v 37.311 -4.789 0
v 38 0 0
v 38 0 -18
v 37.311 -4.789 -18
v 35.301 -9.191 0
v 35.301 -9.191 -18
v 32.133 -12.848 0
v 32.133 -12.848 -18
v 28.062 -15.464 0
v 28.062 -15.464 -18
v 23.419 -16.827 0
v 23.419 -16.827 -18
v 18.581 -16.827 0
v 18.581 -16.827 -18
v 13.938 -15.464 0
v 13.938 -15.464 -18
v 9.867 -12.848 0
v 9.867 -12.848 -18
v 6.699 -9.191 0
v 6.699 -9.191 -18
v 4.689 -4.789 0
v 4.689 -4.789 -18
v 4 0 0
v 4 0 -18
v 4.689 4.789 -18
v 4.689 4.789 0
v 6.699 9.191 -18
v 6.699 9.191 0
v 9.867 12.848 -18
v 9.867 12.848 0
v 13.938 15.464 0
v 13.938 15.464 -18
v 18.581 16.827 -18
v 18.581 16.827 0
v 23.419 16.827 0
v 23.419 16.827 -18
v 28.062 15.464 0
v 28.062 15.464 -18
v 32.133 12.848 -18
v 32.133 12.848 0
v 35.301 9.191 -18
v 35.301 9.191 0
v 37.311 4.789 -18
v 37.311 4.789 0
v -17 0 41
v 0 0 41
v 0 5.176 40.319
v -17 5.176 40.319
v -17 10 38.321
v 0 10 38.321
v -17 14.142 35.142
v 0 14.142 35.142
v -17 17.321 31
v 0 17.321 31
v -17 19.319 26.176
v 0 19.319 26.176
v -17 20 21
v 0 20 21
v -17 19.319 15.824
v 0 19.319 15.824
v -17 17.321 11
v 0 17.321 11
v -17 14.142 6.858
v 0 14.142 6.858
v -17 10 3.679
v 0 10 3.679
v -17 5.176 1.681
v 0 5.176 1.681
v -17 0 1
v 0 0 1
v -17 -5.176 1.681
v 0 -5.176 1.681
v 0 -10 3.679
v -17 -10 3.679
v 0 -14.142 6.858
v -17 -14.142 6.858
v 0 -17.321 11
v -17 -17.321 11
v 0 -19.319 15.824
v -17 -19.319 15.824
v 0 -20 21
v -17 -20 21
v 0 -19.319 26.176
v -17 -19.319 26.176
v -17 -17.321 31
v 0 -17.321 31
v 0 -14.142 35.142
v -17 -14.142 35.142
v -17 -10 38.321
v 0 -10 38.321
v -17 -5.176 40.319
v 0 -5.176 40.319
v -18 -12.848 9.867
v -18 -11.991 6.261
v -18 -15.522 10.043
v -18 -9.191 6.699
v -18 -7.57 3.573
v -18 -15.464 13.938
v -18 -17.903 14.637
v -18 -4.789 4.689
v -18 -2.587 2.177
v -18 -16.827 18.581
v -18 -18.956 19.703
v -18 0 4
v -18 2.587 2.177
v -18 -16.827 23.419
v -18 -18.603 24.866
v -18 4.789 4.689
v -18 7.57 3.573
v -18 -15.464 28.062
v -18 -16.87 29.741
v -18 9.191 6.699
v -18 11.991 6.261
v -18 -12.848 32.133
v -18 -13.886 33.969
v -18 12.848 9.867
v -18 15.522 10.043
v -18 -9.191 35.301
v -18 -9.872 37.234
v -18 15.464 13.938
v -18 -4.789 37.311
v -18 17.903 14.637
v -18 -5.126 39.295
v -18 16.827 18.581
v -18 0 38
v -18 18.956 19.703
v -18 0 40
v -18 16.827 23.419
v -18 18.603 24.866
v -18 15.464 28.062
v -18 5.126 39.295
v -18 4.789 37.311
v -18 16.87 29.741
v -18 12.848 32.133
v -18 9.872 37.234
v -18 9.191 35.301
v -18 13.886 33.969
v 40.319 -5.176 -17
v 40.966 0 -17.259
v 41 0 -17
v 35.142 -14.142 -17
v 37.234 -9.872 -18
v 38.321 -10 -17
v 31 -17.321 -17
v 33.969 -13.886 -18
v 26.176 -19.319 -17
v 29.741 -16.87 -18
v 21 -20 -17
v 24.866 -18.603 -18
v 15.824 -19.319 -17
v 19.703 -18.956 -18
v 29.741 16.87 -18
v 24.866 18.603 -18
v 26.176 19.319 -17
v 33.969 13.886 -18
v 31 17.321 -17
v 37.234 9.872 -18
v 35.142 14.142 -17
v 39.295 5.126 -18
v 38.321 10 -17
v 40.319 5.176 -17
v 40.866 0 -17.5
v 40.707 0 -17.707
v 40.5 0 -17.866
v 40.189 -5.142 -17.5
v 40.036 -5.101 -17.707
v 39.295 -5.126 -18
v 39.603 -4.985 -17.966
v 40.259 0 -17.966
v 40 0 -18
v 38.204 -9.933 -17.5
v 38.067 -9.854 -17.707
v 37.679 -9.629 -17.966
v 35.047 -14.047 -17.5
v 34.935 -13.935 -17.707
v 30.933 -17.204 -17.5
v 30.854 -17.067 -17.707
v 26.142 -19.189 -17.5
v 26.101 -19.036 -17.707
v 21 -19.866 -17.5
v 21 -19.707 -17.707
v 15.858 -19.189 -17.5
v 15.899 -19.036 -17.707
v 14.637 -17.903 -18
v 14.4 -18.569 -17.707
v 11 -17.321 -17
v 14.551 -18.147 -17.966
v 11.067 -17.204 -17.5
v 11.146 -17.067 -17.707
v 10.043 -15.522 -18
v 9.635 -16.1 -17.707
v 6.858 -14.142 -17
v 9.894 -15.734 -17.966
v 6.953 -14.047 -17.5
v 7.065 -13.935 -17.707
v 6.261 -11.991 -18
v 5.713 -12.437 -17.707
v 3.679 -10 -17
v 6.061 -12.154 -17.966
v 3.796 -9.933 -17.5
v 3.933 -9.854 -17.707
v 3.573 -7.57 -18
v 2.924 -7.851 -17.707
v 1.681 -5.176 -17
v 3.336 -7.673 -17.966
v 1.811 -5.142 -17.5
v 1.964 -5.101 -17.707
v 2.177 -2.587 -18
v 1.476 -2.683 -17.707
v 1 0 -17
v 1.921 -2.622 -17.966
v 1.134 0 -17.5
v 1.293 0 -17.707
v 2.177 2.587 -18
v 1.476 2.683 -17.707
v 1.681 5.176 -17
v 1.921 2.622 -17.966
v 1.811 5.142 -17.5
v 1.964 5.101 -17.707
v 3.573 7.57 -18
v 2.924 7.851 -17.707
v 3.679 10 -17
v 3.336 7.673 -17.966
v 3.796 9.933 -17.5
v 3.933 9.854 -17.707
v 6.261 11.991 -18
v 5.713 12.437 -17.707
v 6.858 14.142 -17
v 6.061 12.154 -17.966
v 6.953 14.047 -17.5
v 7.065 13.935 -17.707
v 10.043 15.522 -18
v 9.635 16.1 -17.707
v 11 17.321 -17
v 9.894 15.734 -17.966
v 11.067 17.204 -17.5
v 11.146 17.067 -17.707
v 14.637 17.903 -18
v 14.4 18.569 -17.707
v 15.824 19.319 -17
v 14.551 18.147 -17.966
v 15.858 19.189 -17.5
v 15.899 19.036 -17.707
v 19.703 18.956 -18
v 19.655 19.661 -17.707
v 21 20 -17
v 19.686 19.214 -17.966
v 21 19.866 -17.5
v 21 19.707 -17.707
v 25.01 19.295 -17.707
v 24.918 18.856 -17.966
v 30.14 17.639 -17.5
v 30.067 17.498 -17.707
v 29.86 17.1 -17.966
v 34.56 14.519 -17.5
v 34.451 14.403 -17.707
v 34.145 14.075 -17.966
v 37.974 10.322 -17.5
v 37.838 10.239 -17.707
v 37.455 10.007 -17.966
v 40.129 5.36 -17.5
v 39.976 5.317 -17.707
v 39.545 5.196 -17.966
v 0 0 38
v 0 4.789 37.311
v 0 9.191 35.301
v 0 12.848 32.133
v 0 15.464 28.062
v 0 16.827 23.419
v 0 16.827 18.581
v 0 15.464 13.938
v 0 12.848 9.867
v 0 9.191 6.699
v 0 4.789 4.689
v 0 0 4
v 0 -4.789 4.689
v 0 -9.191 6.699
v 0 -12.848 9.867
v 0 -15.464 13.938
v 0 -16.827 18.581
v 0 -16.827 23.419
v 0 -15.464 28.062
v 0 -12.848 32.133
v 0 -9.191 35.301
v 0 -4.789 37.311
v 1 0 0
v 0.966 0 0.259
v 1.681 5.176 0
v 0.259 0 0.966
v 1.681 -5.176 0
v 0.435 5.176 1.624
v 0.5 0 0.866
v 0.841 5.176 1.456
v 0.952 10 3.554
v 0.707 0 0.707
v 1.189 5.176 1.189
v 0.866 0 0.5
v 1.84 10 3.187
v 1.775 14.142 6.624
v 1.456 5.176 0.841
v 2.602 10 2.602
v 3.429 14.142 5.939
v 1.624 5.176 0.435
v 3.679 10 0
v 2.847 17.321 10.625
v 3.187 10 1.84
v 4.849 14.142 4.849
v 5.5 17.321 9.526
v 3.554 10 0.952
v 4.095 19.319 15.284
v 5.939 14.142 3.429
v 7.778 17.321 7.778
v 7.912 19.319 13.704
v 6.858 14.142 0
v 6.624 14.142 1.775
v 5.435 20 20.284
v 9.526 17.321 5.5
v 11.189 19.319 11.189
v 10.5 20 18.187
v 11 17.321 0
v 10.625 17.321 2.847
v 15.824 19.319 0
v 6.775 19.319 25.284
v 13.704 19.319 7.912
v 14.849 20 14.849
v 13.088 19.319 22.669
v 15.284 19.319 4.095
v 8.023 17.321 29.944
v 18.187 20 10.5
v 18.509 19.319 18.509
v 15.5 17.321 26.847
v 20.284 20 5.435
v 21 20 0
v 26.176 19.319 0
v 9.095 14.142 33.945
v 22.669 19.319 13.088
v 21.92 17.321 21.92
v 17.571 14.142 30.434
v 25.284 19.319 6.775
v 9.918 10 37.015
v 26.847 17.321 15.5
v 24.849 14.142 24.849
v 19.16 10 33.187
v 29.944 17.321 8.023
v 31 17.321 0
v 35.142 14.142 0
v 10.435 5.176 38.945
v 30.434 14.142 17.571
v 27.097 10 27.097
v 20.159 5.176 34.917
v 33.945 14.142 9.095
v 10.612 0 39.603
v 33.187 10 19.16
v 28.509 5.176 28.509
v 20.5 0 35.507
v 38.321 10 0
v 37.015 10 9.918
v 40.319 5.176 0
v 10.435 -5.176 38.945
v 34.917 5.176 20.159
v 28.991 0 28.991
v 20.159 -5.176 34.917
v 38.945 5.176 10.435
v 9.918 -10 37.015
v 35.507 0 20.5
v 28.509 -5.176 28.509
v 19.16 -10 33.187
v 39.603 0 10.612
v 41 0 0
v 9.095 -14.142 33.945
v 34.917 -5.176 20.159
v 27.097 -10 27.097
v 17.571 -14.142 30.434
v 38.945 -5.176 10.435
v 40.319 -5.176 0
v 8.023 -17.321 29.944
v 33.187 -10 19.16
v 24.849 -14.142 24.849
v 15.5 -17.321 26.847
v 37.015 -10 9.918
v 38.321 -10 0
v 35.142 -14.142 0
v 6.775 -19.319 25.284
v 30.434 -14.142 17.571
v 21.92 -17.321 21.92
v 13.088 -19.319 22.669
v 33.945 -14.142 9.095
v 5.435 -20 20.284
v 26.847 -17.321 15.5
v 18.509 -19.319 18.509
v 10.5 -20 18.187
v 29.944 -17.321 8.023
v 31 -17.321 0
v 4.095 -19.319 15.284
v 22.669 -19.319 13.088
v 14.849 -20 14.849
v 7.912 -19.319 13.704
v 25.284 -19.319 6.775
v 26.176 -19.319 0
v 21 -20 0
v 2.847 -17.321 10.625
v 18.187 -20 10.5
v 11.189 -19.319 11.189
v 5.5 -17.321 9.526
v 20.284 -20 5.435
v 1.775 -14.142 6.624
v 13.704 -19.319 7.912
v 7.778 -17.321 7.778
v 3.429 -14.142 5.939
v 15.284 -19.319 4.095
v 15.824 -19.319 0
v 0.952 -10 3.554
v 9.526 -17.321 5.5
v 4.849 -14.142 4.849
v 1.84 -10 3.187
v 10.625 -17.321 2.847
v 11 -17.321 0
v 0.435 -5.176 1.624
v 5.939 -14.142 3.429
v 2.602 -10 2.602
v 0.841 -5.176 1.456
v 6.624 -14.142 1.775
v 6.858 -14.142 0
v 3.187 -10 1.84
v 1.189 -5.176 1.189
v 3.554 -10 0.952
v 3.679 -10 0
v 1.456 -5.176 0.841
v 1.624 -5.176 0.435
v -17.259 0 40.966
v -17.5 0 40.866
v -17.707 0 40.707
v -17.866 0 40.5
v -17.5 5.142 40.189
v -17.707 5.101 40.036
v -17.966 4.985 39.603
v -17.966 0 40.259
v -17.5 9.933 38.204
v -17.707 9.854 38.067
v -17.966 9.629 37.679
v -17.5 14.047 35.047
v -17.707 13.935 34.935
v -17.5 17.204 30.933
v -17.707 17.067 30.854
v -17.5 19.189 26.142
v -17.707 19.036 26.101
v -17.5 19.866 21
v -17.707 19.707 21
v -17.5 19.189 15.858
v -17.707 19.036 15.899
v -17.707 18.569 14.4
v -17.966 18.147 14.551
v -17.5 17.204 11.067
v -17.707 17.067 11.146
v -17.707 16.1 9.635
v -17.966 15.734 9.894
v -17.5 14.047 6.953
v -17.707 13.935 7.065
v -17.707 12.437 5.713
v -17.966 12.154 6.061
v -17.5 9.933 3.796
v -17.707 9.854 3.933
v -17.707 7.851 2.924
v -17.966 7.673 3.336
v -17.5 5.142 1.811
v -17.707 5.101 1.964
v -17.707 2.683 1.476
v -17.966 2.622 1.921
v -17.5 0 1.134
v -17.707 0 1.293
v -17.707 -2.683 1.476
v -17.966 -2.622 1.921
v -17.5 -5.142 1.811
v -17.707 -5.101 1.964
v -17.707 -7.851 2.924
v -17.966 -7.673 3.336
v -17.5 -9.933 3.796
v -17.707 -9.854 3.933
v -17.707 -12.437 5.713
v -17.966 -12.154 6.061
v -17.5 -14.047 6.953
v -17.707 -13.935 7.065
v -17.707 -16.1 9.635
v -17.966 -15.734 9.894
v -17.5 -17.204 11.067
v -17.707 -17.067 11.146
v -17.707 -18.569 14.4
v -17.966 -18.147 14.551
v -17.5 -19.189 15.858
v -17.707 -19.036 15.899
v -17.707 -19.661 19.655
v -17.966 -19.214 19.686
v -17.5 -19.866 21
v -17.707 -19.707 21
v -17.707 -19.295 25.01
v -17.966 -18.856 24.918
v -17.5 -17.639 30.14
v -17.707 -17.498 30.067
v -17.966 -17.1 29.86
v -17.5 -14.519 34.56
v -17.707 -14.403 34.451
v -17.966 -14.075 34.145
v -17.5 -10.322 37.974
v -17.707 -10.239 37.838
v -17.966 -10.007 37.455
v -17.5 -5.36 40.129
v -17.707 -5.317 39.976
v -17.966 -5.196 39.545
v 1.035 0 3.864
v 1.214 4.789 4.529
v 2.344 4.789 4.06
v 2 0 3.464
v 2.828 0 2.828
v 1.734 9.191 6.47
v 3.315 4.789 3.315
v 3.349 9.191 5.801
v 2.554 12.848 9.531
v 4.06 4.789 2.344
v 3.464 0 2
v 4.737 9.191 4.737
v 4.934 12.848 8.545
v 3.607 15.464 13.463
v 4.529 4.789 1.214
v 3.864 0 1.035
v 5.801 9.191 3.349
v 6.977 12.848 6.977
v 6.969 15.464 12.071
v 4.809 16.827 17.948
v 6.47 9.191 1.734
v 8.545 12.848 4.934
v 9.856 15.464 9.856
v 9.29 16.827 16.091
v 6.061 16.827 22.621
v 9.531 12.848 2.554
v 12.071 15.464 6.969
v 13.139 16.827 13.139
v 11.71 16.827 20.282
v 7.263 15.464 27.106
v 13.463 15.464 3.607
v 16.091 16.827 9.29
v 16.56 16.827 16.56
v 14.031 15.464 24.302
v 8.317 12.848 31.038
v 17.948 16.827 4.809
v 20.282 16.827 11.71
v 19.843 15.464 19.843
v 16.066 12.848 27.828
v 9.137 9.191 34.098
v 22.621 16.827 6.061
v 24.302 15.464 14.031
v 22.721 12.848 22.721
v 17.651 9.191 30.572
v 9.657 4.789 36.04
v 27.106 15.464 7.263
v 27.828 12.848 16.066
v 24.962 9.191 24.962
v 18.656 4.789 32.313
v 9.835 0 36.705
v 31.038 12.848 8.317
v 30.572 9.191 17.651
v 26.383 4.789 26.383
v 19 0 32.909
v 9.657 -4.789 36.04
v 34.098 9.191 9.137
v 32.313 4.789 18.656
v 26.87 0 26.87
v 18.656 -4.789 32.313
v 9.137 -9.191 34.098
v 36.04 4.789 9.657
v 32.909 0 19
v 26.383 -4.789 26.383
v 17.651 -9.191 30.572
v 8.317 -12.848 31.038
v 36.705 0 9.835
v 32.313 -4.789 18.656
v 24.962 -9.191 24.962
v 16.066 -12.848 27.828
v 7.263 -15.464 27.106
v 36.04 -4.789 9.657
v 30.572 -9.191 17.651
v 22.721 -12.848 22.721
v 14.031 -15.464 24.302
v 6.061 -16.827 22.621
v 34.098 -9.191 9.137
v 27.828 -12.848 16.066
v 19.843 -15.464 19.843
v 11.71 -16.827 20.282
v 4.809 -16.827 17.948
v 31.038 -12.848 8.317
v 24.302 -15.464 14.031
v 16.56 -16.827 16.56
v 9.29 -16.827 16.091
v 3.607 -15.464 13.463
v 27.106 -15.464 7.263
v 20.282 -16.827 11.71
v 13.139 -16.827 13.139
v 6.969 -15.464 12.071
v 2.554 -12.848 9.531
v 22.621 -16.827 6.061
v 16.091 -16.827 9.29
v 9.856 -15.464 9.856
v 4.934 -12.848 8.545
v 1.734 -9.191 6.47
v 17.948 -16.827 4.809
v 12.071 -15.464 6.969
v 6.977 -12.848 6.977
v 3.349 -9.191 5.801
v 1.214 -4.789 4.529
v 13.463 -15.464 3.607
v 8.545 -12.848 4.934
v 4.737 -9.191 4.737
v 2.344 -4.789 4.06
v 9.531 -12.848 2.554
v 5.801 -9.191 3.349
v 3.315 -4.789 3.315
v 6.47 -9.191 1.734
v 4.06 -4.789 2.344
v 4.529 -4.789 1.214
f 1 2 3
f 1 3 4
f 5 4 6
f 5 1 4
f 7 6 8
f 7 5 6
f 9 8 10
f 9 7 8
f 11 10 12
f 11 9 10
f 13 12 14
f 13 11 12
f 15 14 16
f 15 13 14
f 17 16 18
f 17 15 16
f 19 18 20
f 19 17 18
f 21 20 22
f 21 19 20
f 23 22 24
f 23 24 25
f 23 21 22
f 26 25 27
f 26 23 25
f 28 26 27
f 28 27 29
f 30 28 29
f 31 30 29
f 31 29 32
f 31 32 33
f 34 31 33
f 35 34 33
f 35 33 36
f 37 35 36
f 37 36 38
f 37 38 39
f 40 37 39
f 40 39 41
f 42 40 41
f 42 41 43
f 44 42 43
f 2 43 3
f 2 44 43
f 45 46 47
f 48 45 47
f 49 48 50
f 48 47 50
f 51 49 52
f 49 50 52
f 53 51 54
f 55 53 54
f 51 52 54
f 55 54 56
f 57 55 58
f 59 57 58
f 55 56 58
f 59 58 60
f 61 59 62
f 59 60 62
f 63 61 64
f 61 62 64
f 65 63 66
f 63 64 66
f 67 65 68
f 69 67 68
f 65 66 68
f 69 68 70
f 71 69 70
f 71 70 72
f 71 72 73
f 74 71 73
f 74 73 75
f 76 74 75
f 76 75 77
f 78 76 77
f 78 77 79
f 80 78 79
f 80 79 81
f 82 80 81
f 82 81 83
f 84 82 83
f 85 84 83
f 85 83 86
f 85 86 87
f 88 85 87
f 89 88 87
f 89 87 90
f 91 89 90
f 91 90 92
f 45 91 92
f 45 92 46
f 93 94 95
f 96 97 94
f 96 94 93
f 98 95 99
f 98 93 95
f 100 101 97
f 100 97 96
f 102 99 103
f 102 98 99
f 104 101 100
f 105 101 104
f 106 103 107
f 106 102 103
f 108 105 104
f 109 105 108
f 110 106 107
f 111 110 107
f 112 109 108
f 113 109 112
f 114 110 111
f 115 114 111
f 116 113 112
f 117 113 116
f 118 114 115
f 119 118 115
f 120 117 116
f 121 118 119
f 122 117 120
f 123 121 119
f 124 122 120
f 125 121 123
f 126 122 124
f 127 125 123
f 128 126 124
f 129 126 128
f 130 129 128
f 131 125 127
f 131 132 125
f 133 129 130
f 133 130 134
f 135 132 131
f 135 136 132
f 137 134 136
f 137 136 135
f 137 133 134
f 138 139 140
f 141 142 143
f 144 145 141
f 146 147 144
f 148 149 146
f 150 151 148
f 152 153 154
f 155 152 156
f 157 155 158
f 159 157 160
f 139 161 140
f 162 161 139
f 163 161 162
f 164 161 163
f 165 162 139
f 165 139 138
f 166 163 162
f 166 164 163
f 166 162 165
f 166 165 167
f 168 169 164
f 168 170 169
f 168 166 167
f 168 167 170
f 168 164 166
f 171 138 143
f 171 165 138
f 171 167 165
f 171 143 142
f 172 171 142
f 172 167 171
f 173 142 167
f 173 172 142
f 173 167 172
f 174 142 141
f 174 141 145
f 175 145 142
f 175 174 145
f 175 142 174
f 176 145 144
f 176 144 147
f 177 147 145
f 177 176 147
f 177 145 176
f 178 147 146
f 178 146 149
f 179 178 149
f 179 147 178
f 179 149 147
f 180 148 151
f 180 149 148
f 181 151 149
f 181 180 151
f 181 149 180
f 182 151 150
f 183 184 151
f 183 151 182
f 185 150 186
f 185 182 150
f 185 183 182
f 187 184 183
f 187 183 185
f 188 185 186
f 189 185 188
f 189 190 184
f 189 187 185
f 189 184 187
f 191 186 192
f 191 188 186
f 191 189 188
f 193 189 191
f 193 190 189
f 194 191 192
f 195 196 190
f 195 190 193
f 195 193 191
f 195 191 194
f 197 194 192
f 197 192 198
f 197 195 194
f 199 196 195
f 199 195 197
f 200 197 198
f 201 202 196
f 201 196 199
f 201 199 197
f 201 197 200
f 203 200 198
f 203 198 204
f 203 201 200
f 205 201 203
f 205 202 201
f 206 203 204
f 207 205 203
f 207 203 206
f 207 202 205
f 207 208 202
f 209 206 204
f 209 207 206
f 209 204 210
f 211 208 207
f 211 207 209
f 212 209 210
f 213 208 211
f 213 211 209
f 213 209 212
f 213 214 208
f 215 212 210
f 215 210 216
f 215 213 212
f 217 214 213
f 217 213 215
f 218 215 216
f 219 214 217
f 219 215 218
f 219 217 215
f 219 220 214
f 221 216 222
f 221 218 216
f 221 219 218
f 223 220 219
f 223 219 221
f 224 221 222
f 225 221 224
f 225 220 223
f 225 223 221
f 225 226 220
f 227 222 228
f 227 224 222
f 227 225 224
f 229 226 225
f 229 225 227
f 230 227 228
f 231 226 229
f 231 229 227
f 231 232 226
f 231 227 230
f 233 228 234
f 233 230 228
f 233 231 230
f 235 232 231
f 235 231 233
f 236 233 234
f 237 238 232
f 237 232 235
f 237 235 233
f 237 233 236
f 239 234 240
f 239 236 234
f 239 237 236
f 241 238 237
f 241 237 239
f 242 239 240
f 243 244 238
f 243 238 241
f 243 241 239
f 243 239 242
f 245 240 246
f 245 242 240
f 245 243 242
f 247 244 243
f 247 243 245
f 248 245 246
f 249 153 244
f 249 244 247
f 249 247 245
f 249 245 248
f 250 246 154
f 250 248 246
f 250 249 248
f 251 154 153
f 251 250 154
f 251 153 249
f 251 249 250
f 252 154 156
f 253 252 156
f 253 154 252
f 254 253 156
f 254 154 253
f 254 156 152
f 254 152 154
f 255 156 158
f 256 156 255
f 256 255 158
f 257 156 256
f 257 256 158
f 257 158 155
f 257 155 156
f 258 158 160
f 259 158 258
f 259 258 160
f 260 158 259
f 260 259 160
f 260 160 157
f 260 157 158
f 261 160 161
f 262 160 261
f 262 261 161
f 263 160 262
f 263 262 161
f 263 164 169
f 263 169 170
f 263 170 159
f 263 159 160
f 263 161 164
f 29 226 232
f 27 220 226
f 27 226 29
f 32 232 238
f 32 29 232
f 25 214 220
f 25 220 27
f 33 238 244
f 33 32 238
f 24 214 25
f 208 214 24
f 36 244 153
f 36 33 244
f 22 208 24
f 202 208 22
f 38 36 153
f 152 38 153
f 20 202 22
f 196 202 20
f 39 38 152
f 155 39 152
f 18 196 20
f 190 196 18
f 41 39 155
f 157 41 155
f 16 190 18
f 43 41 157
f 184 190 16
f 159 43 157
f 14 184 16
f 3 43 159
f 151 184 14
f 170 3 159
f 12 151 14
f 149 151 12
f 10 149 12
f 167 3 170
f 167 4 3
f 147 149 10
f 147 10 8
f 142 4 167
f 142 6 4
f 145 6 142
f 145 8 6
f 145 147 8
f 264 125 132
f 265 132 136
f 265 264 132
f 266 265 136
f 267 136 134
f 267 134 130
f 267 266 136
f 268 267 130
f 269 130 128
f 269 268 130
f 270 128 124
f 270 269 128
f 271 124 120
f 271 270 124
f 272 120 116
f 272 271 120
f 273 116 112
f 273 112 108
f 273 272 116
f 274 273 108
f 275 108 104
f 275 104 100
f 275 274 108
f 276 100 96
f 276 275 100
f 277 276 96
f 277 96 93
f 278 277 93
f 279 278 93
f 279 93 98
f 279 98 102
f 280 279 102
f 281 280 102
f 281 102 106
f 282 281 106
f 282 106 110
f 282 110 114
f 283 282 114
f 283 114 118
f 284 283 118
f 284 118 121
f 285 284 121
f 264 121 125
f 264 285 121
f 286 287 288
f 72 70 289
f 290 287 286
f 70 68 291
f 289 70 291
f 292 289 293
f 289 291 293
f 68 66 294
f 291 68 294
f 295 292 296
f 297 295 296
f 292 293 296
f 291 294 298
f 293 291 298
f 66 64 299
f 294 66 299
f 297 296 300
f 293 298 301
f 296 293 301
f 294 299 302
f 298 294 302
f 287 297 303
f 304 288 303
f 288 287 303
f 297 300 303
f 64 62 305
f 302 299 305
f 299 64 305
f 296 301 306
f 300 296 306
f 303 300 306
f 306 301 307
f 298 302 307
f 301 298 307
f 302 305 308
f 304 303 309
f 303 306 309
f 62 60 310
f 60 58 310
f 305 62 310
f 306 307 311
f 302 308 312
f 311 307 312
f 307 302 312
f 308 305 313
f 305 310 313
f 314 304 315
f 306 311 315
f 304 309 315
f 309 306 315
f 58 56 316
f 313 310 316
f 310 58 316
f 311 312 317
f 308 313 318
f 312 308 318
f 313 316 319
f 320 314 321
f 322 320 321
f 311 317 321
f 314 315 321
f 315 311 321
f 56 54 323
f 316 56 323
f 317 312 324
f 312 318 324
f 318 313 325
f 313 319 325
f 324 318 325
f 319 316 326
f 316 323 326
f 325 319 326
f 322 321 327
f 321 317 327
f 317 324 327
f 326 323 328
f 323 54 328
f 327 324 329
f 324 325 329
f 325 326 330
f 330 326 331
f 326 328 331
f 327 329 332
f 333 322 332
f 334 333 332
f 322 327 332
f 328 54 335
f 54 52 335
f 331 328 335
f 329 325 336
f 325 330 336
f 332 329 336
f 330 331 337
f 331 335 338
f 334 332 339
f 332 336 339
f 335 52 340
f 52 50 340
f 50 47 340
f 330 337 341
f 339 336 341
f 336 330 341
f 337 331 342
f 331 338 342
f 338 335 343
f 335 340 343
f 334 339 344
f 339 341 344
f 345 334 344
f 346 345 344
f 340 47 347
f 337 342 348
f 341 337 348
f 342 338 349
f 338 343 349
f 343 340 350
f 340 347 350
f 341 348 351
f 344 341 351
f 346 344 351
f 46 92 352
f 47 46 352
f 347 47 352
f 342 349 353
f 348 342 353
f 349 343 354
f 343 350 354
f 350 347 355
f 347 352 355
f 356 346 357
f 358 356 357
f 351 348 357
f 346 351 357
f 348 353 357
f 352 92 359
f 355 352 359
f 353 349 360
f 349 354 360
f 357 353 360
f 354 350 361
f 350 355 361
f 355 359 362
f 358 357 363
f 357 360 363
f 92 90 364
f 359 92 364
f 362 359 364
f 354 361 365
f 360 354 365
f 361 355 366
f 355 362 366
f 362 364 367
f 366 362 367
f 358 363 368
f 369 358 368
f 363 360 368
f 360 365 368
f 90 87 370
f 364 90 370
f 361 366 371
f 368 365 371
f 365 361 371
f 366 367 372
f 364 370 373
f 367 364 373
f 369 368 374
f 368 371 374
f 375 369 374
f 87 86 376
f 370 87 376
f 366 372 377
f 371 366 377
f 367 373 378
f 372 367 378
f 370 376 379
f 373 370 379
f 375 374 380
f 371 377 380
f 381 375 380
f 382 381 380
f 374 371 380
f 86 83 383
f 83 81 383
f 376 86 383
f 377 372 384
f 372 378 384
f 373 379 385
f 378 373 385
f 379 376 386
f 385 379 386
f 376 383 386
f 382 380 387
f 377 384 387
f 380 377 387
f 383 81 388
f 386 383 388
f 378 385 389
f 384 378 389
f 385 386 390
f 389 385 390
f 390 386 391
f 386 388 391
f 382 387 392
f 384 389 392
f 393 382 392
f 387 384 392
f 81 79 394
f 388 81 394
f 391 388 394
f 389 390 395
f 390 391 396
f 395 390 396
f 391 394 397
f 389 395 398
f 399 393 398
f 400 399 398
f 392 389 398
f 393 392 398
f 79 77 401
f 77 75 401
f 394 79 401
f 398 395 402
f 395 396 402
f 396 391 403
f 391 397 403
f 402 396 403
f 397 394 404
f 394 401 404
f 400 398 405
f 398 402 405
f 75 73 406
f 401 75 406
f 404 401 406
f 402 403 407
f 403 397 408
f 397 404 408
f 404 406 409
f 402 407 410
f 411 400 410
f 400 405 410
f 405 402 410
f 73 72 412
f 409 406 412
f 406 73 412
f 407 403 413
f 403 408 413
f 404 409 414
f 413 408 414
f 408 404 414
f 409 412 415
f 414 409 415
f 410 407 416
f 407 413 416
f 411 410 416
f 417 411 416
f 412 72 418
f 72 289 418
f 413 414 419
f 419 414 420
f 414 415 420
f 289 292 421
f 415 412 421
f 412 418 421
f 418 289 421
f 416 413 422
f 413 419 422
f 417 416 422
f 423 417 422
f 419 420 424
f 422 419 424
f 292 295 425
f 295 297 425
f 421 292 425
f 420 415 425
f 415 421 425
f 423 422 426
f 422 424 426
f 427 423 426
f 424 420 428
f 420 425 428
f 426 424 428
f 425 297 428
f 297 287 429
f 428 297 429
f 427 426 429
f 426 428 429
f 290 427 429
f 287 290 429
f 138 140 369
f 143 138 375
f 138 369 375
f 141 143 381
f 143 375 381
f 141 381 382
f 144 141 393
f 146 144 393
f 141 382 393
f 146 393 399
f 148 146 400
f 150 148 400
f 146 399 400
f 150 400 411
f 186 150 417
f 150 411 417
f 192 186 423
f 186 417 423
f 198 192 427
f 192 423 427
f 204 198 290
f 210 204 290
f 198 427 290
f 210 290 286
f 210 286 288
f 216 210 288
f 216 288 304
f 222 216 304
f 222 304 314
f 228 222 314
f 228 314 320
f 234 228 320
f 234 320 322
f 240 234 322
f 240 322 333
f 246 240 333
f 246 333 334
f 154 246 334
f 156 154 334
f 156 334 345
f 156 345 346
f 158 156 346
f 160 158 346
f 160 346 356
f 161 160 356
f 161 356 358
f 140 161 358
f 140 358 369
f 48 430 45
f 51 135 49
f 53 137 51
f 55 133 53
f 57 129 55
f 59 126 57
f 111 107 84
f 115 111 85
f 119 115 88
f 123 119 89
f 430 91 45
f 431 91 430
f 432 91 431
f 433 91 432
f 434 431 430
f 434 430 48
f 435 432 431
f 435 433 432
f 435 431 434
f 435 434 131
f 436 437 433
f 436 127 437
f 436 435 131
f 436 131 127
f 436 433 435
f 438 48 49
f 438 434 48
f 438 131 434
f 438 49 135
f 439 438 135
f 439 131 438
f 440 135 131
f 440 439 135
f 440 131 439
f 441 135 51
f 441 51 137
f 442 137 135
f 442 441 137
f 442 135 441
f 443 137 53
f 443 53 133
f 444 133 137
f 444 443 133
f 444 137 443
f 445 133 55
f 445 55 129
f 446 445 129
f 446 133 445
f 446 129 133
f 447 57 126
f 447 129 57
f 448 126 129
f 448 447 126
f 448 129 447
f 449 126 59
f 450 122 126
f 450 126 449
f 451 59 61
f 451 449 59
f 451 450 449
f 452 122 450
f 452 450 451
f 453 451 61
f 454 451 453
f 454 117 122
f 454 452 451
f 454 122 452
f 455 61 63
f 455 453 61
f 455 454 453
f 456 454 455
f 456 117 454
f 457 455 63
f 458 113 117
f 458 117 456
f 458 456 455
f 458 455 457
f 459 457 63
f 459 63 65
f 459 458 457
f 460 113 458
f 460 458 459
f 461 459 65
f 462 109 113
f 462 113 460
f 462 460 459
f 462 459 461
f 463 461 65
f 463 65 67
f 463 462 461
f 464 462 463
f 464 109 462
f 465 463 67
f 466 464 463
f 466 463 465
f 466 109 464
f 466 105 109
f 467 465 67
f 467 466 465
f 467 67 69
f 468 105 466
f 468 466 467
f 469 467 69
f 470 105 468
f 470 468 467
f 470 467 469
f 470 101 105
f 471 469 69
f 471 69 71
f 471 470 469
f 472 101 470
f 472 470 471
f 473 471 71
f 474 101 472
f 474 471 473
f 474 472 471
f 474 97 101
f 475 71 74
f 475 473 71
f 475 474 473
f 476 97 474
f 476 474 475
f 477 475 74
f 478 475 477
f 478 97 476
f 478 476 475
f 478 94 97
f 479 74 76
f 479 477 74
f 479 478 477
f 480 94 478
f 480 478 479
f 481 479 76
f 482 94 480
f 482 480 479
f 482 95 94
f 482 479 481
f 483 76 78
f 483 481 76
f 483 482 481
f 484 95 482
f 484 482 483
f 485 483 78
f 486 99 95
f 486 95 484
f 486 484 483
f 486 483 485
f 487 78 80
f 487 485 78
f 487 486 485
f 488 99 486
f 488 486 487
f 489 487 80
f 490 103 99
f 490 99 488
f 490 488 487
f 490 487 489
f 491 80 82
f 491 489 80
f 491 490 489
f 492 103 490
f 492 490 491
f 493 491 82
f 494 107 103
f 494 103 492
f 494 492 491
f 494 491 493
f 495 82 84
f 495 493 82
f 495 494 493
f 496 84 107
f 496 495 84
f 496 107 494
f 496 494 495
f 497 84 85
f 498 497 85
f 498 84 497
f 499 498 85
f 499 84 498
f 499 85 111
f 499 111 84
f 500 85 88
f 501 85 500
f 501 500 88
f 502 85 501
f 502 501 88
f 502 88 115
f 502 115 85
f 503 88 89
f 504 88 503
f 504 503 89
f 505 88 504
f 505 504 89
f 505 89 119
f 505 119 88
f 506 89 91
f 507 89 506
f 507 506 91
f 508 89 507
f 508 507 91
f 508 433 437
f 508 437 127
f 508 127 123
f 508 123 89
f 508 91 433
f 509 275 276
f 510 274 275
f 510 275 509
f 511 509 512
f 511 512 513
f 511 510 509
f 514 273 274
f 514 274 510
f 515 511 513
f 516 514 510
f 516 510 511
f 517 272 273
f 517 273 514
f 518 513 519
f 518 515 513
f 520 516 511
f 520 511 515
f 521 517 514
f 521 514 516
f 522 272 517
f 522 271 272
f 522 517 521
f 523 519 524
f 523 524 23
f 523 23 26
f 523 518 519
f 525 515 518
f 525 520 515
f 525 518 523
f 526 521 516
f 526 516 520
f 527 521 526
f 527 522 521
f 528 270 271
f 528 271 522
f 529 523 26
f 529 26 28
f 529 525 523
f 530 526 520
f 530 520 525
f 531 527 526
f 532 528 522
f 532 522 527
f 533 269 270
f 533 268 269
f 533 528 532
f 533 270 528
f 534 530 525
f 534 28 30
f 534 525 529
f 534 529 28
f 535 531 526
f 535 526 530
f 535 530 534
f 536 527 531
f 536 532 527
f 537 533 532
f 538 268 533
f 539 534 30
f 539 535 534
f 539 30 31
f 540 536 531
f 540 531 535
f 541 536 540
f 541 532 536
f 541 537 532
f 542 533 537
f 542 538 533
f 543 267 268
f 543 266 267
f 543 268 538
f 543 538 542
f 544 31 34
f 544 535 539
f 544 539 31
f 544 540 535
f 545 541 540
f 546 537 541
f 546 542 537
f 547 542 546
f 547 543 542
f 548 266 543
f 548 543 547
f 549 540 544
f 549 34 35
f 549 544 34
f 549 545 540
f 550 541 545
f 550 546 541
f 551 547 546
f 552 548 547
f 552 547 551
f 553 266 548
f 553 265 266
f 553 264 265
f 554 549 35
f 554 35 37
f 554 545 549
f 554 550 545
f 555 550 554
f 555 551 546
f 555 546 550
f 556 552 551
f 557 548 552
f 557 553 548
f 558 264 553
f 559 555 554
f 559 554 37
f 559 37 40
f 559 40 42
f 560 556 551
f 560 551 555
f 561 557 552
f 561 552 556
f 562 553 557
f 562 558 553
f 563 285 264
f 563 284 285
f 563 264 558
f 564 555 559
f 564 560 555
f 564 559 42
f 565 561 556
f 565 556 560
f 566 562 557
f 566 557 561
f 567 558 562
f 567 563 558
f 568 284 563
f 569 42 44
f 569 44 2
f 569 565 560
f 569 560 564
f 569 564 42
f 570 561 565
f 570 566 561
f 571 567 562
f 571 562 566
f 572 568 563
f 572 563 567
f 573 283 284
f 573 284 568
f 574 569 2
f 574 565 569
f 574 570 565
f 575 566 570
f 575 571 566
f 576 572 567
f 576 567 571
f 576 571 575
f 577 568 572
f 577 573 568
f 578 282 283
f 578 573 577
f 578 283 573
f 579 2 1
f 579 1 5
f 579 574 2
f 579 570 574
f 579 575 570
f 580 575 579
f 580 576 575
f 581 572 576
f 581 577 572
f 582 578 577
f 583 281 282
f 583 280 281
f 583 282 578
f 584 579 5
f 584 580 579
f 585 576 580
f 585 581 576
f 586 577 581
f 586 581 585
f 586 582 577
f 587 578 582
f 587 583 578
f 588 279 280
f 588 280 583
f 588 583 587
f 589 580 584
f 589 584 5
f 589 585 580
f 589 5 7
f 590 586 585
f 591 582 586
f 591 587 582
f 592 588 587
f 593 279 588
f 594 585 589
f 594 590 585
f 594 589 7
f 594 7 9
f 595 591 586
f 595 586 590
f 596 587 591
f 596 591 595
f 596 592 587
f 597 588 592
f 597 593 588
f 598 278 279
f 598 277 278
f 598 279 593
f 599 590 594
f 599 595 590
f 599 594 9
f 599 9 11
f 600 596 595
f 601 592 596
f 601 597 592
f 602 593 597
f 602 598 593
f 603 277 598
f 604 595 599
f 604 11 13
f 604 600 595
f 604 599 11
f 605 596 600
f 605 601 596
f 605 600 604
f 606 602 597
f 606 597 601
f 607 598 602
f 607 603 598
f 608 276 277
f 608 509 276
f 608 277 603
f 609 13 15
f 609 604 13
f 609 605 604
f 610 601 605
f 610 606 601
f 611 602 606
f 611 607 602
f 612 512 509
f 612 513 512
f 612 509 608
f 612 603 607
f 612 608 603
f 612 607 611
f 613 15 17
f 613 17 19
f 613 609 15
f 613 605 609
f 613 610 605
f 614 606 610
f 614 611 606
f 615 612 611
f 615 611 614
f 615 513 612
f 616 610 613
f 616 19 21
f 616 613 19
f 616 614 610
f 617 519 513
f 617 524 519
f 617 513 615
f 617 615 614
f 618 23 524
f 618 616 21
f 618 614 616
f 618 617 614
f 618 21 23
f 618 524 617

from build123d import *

# Parameters (mm, degrees)
CROQUIS1_R               = 20
CROQUIS1_R_2             = 17
REVOLUCI_N_L_MINA1_ANGLE = 90
CROQUIS3_R               = 20
CROQUIS3_R_2             = 17
EXTRUIR1_DEPTH           = 18
CROQUIS4_R               = 20
CROQUIS4_R_2             = 17
EXTRUIR2_DEPTH           = 18
REDONDEO1_R              = 1


with BuildPart() as part:
    # Croquis1 → Revolución-Lámina1 (revolve)
    with BuildSketch(Plane(origin=(0, 0, 0), x_dir=(0, 0, -1), z_dir=(1, 0, 0))):
        with Locations((-21, 0)):
            Circle(CROQUIS1_R)
        with Locations((-21, 0)):
            Circle(CROQUIS1_R_2, mode=Mode.SUBTRACT)
    revolve(axis=Axis((0, 0, 0), (0, 1, 0)), revolution_arc=REVOLUCI_N_L_MINA1_ANGLE)

    # Croquis3 → Extruir1 (add)
    with BuildSketch(Plane.ZY):
        with Locations((21, 0)):
            Circle(CROQUIS3_R)
        with Locations((21, 0)):
            Circle(CROQUIS3_R_2, mode=Mode.SUBTRACT)
    extrude(amount=EXTRUIR1_DEPTH)

    # Croquis4 → Extruir2 (add)
    with BuildSketch(Plane(origin=(0, 0, 0), x_dir=(-1, 0, 0), z_dir=(0, 0, -1))):
        with Locations(Location((-21, 0, 0), (0, 0, 180))):
            Circle(CROQUIS4_R)
        with Locations(Location((-21, 0, 0), (0, 0, 180))):
            Circle(CROQUIS4_R_2, mode=Mode.SUBTRACT)
    extrude(amount=EXTRUIR2_DEPTH)

    # Redondeo1
    redondeo1_edges = [part.edges().sort_by_distance(p)[0] for p in [
        (1, 0, -18),
        (-18, 0, 1),
    ]]
    fillet(redondeo1_edges, radius=REDONDEO1_R)


solid = part.part
